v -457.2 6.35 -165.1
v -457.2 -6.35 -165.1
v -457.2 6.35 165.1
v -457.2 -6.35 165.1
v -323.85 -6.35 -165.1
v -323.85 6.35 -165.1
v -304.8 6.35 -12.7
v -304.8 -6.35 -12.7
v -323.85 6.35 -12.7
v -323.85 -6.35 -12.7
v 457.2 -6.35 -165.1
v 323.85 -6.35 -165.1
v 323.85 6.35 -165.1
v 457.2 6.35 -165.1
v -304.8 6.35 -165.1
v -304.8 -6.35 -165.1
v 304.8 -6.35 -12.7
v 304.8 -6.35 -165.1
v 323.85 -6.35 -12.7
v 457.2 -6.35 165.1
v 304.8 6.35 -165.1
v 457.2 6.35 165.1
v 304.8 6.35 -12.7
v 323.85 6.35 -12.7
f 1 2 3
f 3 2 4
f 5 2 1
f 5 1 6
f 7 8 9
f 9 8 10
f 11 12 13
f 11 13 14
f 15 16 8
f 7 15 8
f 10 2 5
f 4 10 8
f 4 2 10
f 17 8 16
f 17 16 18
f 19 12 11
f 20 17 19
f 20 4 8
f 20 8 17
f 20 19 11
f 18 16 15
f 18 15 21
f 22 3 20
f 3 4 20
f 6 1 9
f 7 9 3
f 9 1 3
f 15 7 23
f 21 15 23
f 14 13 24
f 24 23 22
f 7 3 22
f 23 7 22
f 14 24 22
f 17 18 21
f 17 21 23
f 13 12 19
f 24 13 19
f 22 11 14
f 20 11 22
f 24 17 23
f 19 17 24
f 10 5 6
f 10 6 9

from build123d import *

# Parameters (mm, degrees)
F0_W     = 914.4
F0_H     = 330.2
F1_DEPTH = 6.35
F2_W     = 19.05
F2_H     = 152.4
F3_DEPTH = 12.701


# Not quite as in the source:
# - a pattern or mirror of a feature is missing from the dataset's text; its kind, count and spacing are read off the source's solid


with BuildPart() as f1:
    # F0 (on Front) → F1 (new body, symmetric)
    with BuildSketch(Plane.XZ):
        Rectangle(F0_W, F0_H)
    extrude(amount=F1_DEPTH, both=True)

    # F2 (on face) → F3 (cut, through all)
    with BuildSketch(Plane.XZ.offset(6.35)):
        with Locations((314.325, -88.9)):
            Rectangle(F2_W, F2_H)
    f3 = extrude(amount=-F3_DEPTH, mode=Mode.SUBTRACT)

    # F3_copies: F3 across plane
    add(f3.mirror(Plane(origin=(0, 0, 0), x_dir=(0, 0, -1), z_dir=(-1, 0, 0))), mode=Mode.SUBTRACT)


solid = f1.part
